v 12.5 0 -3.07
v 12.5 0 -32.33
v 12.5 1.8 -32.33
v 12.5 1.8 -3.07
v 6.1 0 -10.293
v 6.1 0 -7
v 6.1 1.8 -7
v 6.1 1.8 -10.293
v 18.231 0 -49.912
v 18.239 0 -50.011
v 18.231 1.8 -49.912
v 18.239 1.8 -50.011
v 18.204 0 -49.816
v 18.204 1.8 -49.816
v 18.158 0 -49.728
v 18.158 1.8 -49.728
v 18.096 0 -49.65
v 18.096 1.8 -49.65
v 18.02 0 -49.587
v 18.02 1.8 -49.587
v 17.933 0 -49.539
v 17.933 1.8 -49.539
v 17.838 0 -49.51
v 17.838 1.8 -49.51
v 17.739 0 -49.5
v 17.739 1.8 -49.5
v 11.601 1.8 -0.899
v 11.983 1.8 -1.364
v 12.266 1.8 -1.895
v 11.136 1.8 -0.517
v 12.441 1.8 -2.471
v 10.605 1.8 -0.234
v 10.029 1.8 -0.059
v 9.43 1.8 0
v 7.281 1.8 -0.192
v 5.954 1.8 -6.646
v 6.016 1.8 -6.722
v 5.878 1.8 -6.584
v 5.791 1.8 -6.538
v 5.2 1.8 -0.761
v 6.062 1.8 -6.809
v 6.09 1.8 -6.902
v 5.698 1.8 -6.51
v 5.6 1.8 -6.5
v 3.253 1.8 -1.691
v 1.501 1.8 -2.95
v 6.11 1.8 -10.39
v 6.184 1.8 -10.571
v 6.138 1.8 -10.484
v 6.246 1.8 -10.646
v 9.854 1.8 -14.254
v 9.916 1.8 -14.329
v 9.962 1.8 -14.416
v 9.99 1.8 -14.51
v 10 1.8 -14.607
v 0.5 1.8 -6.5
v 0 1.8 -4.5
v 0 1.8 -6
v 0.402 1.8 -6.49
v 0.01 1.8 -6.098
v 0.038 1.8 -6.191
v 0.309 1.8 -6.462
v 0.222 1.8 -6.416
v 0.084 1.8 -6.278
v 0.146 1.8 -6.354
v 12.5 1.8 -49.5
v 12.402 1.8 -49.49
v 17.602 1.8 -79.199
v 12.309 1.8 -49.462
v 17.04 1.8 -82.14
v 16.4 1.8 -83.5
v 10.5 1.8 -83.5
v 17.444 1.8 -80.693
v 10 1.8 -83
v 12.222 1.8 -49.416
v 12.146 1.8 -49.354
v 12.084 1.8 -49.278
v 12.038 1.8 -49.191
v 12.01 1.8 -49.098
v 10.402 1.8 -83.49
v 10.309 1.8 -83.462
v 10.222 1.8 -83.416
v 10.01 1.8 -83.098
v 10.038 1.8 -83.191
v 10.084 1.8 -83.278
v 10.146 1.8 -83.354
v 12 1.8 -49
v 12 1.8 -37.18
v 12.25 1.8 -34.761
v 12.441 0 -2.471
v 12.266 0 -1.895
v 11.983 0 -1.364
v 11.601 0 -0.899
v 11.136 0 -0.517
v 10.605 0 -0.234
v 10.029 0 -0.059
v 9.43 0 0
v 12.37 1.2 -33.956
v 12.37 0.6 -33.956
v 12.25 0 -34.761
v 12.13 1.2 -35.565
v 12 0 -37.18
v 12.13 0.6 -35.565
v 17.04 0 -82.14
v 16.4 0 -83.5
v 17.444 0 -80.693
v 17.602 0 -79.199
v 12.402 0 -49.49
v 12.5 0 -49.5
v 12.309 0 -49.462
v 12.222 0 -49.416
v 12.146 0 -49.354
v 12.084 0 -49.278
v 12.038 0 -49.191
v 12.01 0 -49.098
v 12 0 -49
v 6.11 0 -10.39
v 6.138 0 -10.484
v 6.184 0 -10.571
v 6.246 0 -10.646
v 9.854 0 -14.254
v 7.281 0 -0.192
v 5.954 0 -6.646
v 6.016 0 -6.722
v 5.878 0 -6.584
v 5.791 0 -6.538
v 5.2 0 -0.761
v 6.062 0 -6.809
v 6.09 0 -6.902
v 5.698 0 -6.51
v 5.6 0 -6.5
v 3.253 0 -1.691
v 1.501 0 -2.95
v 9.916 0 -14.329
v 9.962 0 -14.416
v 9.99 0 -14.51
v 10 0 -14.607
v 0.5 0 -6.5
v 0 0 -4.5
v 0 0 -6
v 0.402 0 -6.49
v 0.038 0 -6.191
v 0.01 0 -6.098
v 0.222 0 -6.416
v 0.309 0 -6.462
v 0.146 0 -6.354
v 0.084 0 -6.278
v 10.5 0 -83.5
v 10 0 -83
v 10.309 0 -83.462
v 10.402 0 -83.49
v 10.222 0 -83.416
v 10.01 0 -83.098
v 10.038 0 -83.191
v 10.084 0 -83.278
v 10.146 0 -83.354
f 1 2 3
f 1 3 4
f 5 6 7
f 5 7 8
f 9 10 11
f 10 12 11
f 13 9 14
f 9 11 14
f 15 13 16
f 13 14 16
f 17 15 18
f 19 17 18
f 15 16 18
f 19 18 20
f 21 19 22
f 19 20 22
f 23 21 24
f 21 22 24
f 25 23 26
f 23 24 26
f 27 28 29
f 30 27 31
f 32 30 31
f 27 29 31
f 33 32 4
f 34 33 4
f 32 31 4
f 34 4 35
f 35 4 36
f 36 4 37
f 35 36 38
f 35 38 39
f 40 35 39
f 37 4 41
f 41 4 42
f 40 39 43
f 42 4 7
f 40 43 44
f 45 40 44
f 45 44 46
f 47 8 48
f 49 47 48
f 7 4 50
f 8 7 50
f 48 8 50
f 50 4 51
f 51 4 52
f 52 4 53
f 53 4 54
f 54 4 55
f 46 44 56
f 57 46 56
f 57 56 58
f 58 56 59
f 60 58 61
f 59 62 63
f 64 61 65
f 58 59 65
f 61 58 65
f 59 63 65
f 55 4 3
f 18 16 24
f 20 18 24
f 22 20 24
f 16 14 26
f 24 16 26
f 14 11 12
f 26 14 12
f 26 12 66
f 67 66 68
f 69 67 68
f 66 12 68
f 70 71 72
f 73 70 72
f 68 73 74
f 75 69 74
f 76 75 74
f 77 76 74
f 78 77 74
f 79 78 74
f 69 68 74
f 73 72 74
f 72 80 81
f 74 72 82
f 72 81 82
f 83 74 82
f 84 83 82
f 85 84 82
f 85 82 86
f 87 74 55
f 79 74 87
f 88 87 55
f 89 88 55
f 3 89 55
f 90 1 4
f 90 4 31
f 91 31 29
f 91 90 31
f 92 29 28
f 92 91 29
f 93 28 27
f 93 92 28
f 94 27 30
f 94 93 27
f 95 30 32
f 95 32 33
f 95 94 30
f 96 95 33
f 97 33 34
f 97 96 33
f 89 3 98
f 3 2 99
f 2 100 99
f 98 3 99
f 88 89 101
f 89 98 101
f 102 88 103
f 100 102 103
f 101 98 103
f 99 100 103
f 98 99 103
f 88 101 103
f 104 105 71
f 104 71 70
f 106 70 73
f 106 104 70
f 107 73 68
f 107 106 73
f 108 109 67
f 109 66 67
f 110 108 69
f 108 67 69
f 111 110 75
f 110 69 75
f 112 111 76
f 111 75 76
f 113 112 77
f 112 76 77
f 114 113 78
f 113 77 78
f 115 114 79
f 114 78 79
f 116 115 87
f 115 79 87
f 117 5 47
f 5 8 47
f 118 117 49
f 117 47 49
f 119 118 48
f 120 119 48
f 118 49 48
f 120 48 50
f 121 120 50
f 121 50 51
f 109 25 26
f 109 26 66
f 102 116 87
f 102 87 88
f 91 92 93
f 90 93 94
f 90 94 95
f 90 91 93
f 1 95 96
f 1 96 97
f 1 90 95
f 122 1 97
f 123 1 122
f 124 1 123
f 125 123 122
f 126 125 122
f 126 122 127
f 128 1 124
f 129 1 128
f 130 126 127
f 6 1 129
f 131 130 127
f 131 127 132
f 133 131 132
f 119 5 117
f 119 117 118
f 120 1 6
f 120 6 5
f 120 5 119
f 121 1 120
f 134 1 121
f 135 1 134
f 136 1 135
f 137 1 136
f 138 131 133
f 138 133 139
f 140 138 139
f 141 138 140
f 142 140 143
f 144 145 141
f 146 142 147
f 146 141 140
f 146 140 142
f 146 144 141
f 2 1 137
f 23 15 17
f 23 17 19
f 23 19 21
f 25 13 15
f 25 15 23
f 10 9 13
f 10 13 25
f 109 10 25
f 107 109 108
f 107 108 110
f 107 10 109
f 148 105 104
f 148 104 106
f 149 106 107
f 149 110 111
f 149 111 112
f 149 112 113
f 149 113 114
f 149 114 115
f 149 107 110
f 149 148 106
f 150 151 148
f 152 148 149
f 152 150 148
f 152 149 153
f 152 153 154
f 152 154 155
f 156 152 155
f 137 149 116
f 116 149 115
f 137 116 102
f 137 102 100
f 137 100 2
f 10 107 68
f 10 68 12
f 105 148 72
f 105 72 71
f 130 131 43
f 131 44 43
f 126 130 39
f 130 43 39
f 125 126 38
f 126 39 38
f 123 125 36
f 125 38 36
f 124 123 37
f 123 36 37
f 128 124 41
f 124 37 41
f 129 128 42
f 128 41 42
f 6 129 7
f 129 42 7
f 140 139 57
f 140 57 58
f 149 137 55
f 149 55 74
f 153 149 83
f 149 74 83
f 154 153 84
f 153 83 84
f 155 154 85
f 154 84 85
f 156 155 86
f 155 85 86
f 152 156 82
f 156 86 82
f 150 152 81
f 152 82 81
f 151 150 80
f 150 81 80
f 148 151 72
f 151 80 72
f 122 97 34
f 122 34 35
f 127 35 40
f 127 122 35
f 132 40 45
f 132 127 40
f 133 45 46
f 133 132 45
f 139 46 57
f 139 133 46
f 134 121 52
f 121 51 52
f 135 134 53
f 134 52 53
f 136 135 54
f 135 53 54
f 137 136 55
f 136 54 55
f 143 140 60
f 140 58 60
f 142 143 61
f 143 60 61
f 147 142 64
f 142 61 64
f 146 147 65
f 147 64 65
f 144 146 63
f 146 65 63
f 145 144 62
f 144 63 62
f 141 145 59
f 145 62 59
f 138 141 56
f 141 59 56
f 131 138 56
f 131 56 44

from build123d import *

# Parameters (mm, degrees)
BOSS_EXTRUDE1_DEPTH = 1.8
FILLET2_R           = 0.5


with BuildPart() as part:
    # Sketch1 → Boss-Extrude1 (new body)
    with BuildSketch(Plane(origin=(0, 0, 0), x_dir=(1, 0, 0), z_dir=(0, 1, 0))):
        with BuildLine():
            Line((0, 4.5), (0, 6.5))
            Line((0, 6.5), (6.1, 6.5))
            Line((6.1, 6.5), (6.1, 10.5))
            Line((6.1, 10.5), (10, 14.4))
            Line((10, 14.4), (10, 83.5))
            Line((10, 83.5), (16.4, 83.5))
            ThreePointArc((16.4, 83.5), (17.2719581, 81.425344658), (17.601960582, 79.199226044))
            Line((17.601960582, 79.199226044), (18.25, 49.5))
            Line((18.25, 49.5), (12, 49.5))
            Line((12, 49.5), (12, 37.18))
            add(Edge.make_bspline(
                [(12.5, 32.33), (12.5, 33.972282338), (12, 35.554764974), (12, 37.18)],
                knots=[0, 0, 0, 0, 1, 1, 1, 1], degree=3))
            Line((12.5, 32.33), (12.5, 3.07))
            ThreePointArc((12.5, 3.07), (11.600817818, 0.899182182), (9.43, 0))
            ThreePointArc((9.43, 0), (4.205660329, 1.182650422), (0, 4.5))
        make_face()
    extrude(amount=BOSS_EXTRUDE1_DEPTH)

    # Fillet2
    fillet2_edges = [part.edges().sort_by_distance(p)[0] for p in [
        (0, 0.9, -6.5),
        (6.1, 0.9, -6.5),
        (6.1, 0.9, -10.5),
        (10, 0.9, -14.4),
        (10, 0.9, -83.5),
        (18.25, 0.9, -49.5),
        (12, 0.9, -49.5),
    ]]
    fillet(fillet2_edges, radius=FILLET2_R)


solid = part.part
